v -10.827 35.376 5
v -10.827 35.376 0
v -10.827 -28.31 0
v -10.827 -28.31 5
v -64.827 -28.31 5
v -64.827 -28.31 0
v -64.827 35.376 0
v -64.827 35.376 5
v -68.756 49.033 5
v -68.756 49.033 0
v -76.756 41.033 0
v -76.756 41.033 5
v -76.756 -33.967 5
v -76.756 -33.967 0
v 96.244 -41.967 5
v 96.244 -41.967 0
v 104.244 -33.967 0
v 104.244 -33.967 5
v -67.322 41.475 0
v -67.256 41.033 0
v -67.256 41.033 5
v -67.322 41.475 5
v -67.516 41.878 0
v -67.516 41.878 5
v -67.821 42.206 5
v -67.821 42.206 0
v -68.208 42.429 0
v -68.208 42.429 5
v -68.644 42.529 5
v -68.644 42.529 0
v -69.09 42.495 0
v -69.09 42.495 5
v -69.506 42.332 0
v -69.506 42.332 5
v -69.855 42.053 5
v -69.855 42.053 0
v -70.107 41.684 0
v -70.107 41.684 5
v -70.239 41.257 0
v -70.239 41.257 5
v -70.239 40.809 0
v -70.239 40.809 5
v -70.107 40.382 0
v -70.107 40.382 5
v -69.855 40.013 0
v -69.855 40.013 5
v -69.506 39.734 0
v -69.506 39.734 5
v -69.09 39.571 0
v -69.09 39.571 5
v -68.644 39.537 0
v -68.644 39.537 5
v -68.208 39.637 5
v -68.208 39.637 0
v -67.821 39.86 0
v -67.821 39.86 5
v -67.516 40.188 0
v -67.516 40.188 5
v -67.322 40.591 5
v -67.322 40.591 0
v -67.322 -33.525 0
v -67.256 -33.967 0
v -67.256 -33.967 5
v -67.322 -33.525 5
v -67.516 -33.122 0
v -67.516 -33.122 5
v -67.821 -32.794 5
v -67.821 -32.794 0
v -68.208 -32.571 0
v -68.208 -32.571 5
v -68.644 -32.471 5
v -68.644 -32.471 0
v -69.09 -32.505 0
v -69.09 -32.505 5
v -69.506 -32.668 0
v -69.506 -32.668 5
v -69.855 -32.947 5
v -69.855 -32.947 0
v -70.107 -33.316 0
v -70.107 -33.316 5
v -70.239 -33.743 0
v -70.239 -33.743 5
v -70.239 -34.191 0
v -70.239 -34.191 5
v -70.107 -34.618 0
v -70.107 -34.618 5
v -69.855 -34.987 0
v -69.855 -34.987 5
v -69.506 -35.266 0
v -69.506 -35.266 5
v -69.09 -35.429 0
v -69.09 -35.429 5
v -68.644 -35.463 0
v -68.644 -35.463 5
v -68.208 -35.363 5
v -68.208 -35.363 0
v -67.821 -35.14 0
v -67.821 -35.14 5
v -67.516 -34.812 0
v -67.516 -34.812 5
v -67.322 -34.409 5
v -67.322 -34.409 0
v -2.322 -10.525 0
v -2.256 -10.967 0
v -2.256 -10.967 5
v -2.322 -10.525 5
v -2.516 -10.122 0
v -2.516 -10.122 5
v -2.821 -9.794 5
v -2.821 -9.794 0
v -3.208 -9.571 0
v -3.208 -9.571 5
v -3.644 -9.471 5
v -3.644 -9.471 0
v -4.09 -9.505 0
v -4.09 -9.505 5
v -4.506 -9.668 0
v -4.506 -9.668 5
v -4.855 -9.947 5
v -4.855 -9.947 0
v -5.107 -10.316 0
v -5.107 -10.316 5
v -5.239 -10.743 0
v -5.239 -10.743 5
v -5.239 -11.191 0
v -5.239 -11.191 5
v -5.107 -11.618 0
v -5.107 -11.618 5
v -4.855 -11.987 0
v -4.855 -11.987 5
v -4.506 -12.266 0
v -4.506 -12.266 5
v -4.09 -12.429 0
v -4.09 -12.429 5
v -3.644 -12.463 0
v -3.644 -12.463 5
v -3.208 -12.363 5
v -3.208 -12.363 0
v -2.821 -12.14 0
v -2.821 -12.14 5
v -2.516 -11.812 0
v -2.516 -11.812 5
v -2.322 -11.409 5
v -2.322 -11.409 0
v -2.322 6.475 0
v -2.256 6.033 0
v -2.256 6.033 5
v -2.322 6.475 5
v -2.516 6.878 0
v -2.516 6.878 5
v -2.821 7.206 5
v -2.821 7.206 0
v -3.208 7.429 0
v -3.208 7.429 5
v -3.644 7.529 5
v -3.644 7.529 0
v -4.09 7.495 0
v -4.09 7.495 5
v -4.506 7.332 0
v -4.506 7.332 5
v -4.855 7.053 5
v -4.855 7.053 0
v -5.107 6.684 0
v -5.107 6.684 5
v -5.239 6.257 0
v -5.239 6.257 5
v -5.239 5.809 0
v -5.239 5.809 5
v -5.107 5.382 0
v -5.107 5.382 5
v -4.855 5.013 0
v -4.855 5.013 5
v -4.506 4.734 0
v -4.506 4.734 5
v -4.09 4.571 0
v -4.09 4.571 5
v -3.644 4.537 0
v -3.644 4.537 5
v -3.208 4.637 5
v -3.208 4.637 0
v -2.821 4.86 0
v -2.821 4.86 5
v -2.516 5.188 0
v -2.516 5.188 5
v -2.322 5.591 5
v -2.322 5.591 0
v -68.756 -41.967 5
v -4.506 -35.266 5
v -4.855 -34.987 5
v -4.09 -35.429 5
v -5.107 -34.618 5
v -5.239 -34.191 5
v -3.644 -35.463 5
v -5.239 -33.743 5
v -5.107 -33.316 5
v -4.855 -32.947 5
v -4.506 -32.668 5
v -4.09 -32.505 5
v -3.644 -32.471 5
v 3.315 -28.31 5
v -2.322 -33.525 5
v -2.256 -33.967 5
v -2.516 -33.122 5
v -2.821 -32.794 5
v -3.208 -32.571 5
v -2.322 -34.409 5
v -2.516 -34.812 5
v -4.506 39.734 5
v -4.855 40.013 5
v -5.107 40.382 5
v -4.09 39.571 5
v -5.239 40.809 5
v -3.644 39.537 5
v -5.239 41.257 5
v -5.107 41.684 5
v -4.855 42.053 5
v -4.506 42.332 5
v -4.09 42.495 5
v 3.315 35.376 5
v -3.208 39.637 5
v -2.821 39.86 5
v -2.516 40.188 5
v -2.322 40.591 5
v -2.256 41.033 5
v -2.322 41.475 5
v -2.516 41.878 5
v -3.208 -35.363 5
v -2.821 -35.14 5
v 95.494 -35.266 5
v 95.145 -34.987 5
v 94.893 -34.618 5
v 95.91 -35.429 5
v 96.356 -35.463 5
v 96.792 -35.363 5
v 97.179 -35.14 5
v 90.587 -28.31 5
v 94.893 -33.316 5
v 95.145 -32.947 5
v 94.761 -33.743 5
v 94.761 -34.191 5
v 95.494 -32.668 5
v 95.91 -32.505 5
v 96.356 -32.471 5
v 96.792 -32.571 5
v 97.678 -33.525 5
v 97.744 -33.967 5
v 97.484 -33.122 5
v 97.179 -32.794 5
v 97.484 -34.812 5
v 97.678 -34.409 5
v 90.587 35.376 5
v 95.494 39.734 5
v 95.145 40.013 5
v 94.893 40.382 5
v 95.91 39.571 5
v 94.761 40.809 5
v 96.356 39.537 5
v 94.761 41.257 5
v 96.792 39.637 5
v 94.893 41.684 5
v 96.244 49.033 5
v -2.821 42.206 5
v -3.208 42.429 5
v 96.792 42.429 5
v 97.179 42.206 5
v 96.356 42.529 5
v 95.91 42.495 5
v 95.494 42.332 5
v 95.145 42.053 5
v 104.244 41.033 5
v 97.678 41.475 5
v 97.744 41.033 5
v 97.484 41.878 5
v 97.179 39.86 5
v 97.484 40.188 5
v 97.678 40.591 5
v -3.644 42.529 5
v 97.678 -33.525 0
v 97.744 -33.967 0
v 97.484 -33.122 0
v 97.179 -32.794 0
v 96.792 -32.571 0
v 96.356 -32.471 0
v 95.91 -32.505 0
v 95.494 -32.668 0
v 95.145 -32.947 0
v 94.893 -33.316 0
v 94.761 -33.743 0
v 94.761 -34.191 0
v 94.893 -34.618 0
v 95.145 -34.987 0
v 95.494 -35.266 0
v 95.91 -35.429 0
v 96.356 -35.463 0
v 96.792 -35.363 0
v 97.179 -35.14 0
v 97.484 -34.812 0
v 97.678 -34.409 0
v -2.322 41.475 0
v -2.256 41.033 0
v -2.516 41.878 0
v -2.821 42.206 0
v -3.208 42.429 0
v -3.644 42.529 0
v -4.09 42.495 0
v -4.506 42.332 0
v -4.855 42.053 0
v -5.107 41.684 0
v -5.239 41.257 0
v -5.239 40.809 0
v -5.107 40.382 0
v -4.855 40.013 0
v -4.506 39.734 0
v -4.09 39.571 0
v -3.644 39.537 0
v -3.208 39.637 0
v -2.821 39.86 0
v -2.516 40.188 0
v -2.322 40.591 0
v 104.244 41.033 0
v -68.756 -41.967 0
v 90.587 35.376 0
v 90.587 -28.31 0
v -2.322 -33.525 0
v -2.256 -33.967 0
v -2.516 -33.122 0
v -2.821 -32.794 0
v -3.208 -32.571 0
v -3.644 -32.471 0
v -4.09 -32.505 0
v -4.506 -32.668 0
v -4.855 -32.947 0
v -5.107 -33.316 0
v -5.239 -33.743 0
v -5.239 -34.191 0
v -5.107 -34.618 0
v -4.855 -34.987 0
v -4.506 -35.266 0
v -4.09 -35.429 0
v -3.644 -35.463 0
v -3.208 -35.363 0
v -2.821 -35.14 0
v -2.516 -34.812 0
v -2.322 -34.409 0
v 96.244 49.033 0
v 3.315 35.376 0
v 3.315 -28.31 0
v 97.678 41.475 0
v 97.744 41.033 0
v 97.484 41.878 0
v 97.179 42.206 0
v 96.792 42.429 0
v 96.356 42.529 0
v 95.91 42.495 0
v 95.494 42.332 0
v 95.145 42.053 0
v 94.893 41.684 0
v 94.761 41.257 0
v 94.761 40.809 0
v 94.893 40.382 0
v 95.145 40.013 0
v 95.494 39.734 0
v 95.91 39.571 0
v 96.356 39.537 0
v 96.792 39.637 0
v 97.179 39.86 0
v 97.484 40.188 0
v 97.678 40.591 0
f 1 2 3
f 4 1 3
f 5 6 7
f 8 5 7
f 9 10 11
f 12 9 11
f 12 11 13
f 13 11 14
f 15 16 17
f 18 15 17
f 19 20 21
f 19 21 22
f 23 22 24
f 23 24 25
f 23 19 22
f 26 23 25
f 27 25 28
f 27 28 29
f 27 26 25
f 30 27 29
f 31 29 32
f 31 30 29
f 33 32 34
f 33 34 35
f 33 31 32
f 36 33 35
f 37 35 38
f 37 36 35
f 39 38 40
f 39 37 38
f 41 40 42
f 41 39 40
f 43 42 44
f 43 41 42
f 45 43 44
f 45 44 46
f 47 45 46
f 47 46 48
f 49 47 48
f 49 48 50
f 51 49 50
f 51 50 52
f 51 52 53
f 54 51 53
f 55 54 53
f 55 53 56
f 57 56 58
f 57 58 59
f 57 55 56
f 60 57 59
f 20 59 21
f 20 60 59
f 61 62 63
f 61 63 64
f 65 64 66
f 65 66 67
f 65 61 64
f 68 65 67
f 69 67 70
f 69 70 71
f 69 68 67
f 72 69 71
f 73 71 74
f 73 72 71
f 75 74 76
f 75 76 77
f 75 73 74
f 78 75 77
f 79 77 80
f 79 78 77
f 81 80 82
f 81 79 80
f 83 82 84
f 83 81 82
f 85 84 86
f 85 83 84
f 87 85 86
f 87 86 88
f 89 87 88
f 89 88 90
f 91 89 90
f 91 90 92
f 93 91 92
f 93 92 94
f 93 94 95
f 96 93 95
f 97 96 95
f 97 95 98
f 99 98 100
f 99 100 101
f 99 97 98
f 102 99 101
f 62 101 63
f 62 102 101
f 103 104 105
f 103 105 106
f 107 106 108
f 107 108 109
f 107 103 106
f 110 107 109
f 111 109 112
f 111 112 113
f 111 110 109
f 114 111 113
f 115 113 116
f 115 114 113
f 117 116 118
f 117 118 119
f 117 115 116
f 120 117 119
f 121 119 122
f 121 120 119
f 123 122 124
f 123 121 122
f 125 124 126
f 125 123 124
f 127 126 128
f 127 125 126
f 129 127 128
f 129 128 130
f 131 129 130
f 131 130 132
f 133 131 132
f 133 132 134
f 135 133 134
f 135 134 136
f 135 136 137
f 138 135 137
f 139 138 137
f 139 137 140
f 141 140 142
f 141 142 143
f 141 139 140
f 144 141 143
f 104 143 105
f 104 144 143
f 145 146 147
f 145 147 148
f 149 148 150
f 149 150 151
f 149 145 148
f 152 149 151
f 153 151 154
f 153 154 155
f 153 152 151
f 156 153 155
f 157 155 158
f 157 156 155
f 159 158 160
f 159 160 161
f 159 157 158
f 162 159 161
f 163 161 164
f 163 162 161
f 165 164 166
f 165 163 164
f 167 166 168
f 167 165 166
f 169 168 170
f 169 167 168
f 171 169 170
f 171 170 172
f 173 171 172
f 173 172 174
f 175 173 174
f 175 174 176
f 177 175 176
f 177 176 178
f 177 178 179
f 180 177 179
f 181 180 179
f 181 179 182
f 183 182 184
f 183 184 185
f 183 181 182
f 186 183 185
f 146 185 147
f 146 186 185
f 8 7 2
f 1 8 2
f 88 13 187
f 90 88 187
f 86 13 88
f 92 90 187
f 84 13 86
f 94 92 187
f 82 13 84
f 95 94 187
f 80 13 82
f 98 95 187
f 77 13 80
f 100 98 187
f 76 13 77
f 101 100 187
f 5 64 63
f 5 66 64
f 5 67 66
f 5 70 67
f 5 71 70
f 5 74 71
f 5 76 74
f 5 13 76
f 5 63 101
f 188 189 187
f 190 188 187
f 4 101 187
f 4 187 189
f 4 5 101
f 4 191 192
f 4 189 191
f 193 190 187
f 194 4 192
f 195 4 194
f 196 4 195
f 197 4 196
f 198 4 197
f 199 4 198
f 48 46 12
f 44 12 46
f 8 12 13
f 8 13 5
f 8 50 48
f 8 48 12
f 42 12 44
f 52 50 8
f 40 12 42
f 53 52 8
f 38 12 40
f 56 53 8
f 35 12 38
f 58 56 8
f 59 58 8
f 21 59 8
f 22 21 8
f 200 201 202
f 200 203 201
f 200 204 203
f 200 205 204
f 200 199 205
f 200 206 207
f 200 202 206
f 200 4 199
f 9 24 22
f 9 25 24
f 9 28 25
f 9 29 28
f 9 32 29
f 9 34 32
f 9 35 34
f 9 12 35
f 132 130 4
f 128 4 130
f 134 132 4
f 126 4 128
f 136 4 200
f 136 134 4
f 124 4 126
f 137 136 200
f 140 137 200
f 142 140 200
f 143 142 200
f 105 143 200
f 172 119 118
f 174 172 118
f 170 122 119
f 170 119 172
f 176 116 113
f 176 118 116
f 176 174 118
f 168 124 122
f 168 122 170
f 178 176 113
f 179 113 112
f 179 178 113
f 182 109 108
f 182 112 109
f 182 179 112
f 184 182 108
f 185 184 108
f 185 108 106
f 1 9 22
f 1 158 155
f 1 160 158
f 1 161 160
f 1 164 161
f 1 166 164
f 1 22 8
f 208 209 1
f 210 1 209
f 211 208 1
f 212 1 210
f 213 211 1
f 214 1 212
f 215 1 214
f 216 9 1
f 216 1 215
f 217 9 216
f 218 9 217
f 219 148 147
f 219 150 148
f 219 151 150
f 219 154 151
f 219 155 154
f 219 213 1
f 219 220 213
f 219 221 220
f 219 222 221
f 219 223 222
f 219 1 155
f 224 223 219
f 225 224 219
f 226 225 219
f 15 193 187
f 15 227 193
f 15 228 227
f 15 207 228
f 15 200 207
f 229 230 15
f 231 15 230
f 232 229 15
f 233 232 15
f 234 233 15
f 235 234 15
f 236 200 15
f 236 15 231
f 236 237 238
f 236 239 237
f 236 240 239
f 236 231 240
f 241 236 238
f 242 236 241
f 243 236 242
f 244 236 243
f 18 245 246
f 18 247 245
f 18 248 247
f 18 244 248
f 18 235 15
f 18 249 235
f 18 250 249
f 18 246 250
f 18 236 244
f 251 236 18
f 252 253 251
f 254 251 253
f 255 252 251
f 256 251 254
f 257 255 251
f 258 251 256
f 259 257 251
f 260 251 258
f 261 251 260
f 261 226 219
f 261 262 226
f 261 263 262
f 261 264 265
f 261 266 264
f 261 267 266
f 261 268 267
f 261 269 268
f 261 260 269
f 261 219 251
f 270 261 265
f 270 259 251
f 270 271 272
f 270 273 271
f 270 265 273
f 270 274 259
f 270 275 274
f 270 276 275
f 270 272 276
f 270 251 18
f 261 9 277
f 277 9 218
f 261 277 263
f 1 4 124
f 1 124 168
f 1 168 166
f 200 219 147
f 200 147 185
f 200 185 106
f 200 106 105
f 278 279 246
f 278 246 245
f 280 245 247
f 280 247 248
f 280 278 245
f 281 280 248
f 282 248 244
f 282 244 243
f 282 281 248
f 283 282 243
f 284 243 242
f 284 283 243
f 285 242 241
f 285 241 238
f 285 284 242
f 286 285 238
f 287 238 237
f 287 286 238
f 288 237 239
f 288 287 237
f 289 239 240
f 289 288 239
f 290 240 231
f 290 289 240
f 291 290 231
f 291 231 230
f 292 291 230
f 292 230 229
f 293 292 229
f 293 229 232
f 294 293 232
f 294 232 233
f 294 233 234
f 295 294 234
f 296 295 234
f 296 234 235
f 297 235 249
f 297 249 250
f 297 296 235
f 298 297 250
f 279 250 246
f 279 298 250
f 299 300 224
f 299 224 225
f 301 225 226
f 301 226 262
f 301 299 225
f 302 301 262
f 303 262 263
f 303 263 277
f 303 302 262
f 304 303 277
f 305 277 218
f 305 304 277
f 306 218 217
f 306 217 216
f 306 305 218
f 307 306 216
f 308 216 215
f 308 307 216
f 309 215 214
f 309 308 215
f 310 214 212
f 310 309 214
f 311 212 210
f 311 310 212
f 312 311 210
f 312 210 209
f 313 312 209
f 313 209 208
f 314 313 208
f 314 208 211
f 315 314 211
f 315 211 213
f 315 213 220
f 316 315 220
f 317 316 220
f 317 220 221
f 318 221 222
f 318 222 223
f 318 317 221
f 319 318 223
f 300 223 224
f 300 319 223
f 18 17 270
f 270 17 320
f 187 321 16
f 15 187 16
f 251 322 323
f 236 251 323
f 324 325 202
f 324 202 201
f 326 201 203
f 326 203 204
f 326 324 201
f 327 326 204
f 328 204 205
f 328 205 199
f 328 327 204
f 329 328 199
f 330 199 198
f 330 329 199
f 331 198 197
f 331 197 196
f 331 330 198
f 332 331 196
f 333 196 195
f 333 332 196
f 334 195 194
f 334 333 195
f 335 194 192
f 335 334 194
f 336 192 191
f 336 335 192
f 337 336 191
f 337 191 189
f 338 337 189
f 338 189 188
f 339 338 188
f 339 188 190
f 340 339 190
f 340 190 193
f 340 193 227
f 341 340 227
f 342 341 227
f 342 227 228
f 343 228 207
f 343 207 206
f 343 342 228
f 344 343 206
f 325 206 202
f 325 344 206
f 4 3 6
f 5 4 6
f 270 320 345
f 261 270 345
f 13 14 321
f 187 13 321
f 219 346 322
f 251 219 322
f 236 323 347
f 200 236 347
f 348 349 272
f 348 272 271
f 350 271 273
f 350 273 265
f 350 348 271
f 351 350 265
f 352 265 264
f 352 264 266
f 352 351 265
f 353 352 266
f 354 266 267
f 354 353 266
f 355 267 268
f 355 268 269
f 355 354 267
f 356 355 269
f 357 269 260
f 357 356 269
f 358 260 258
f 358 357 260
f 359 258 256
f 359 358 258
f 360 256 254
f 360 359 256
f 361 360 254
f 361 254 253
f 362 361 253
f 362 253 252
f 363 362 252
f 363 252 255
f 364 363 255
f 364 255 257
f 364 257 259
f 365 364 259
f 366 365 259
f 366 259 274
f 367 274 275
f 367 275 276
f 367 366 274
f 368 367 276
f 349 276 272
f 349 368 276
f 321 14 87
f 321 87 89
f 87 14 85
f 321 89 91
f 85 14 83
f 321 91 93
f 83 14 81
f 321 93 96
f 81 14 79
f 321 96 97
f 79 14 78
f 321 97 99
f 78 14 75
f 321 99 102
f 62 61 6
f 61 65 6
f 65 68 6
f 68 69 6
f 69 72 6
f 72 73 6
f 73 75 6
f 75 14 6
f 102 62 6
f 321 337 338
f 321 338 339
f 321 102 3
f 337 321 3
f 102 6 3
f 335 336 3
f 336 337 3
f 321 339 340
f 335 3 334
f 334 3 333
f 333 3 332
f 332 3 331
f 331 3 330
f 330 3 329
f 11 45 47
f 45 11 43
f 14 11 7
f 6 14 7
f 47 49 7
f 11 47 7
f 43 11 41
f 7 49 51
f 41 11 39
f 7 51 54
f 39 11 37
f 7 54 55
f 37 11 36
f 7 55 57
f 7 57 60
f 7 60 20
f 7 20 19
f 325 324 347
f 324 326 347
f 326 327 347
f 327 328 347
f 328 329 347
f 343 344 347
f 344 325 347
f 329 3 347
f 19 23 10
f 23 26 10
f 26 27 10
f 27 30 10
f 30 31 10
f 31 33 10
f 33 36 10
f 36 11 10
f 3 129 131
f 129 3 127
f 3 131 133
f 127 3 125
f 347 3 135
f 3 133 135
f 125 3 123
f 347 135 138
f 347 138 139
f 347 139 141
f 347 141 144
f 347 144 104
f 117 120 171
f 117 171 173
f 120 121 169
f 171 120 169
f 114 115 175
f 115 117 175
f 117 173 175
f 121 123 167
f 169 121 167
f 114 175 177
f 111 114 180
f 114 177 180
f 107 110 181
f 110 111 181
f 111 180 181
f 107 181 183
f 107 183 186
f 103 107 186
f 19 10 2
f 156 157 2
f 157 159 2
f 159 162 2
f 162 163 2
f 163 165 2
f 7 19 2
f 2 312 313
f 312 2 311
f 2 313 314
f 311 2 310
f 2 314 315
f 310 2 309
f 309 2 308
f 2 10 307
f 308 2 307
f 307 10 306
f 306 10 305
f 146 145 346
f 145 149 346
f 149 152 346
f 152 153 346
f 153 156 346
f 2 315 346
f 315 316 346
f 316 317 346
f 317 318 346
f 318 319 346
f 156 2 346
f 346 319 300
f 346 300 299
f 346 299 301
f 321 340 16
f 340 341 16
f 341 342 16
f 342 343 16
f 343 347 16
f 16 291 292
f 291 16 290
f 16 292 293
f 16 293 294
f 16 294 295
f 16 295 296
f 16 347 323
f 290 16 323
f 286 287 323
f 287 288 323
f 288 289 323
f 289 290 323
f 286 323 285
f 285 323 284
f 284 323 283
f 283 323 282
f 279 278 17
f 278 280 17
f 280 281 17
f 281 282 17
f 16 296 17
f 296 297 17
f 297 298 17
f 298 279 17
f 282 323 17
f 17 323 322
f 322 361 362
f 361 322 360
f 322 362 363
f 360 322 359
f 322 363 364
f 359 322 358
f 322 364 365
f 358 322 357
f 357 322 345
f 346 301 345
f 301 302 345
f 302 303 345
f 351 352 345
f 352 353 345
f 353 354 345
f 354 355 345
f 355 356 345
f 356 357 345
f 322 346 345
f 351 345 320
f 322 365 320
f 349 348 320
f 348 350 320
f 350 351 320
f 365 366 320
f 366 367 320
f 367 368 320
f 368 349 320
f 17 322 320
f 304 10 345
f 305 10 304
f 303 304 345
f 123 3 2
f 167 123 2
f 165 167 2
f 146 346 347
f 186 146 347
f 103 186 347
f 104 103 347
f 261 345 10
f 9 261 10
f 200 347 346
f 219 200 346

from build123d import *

# Parameters (mm, degrees)
SKETCH_1_R      = 1.5
EXTRUDE_1_DEPTH = 5


with BuildPart() as part:
    # 草图1 → 凸台-拉伸1 (new body)
    with BuildSketch(Plane.XY):
        Polygon((96.244173447, 49.032986466), (-3.755826553, 49.032986466), (-68.755826553, 49.032986466), (-76.755820543, 41.032992475), (-76.755820543, -33.967007525), (-68.755826553, -41.967013534), (96.244173447, -41.967013534), (104.244173447, -33.967013534), (104.244173447, 41.032986466), align=None)
        with Locations((-68.755826553, -33.967007525)):
            Circle(SKETCH_1_R, mode=Mode.SUBTRACT)
        with Locations((-3.755826553, -33.967013534)):
            Circle(SKETCH_1_R, mode=Mode.SUBTRACT)
        with Locations((-3.755826553, -10.967013534)):
            Circle(SKETCH_1_R, mode=Mode.SUBTRACT)
        with Locations((96.244173447, -33.967013534)):
            Circle(SKETCH_1_R, mode=Mode.SUBTRACT)
        Polygon((-64.826894365, -28.310159285), (-64.826894365, 35.376132216), (-10.826894365, 35.376132216), (-10.826894365, 28.305064404), (-10.826894365, -28.310159285), align=None, mode=Mode.SUBTRACT)
        with Locations((-3.755826553, 6.032986466)):
            Circle(SKETCH_1_R, mode=Mode.SUBTRACT)
        with Locations((-68.755826553, 41.032992475)):
            Circle(SKETCH_1_R, mode=Mode.SUBTRACT)
        with Locations((-3.755826553, 41.032986466)):
            Circle(SKETCH_1_R, mode=Mode.SUBTRACT)
        Polygon((90.587319198, -28.310159285), (3.315241259, -28.310159285), (3.315241259, 28.305064404), (3.315241259, 35.376132216), (90.587319198, 35.376132216), align=None, mode=Mode.SUBTRACT)
        with Locations((96.244173447, 41.032986466)):
            Circle(SKETCH_1_R, mode=Mode.SUBTRACT)
    extrude(amount=EXTRUDE_1_DEPTH)


solid = part.part
